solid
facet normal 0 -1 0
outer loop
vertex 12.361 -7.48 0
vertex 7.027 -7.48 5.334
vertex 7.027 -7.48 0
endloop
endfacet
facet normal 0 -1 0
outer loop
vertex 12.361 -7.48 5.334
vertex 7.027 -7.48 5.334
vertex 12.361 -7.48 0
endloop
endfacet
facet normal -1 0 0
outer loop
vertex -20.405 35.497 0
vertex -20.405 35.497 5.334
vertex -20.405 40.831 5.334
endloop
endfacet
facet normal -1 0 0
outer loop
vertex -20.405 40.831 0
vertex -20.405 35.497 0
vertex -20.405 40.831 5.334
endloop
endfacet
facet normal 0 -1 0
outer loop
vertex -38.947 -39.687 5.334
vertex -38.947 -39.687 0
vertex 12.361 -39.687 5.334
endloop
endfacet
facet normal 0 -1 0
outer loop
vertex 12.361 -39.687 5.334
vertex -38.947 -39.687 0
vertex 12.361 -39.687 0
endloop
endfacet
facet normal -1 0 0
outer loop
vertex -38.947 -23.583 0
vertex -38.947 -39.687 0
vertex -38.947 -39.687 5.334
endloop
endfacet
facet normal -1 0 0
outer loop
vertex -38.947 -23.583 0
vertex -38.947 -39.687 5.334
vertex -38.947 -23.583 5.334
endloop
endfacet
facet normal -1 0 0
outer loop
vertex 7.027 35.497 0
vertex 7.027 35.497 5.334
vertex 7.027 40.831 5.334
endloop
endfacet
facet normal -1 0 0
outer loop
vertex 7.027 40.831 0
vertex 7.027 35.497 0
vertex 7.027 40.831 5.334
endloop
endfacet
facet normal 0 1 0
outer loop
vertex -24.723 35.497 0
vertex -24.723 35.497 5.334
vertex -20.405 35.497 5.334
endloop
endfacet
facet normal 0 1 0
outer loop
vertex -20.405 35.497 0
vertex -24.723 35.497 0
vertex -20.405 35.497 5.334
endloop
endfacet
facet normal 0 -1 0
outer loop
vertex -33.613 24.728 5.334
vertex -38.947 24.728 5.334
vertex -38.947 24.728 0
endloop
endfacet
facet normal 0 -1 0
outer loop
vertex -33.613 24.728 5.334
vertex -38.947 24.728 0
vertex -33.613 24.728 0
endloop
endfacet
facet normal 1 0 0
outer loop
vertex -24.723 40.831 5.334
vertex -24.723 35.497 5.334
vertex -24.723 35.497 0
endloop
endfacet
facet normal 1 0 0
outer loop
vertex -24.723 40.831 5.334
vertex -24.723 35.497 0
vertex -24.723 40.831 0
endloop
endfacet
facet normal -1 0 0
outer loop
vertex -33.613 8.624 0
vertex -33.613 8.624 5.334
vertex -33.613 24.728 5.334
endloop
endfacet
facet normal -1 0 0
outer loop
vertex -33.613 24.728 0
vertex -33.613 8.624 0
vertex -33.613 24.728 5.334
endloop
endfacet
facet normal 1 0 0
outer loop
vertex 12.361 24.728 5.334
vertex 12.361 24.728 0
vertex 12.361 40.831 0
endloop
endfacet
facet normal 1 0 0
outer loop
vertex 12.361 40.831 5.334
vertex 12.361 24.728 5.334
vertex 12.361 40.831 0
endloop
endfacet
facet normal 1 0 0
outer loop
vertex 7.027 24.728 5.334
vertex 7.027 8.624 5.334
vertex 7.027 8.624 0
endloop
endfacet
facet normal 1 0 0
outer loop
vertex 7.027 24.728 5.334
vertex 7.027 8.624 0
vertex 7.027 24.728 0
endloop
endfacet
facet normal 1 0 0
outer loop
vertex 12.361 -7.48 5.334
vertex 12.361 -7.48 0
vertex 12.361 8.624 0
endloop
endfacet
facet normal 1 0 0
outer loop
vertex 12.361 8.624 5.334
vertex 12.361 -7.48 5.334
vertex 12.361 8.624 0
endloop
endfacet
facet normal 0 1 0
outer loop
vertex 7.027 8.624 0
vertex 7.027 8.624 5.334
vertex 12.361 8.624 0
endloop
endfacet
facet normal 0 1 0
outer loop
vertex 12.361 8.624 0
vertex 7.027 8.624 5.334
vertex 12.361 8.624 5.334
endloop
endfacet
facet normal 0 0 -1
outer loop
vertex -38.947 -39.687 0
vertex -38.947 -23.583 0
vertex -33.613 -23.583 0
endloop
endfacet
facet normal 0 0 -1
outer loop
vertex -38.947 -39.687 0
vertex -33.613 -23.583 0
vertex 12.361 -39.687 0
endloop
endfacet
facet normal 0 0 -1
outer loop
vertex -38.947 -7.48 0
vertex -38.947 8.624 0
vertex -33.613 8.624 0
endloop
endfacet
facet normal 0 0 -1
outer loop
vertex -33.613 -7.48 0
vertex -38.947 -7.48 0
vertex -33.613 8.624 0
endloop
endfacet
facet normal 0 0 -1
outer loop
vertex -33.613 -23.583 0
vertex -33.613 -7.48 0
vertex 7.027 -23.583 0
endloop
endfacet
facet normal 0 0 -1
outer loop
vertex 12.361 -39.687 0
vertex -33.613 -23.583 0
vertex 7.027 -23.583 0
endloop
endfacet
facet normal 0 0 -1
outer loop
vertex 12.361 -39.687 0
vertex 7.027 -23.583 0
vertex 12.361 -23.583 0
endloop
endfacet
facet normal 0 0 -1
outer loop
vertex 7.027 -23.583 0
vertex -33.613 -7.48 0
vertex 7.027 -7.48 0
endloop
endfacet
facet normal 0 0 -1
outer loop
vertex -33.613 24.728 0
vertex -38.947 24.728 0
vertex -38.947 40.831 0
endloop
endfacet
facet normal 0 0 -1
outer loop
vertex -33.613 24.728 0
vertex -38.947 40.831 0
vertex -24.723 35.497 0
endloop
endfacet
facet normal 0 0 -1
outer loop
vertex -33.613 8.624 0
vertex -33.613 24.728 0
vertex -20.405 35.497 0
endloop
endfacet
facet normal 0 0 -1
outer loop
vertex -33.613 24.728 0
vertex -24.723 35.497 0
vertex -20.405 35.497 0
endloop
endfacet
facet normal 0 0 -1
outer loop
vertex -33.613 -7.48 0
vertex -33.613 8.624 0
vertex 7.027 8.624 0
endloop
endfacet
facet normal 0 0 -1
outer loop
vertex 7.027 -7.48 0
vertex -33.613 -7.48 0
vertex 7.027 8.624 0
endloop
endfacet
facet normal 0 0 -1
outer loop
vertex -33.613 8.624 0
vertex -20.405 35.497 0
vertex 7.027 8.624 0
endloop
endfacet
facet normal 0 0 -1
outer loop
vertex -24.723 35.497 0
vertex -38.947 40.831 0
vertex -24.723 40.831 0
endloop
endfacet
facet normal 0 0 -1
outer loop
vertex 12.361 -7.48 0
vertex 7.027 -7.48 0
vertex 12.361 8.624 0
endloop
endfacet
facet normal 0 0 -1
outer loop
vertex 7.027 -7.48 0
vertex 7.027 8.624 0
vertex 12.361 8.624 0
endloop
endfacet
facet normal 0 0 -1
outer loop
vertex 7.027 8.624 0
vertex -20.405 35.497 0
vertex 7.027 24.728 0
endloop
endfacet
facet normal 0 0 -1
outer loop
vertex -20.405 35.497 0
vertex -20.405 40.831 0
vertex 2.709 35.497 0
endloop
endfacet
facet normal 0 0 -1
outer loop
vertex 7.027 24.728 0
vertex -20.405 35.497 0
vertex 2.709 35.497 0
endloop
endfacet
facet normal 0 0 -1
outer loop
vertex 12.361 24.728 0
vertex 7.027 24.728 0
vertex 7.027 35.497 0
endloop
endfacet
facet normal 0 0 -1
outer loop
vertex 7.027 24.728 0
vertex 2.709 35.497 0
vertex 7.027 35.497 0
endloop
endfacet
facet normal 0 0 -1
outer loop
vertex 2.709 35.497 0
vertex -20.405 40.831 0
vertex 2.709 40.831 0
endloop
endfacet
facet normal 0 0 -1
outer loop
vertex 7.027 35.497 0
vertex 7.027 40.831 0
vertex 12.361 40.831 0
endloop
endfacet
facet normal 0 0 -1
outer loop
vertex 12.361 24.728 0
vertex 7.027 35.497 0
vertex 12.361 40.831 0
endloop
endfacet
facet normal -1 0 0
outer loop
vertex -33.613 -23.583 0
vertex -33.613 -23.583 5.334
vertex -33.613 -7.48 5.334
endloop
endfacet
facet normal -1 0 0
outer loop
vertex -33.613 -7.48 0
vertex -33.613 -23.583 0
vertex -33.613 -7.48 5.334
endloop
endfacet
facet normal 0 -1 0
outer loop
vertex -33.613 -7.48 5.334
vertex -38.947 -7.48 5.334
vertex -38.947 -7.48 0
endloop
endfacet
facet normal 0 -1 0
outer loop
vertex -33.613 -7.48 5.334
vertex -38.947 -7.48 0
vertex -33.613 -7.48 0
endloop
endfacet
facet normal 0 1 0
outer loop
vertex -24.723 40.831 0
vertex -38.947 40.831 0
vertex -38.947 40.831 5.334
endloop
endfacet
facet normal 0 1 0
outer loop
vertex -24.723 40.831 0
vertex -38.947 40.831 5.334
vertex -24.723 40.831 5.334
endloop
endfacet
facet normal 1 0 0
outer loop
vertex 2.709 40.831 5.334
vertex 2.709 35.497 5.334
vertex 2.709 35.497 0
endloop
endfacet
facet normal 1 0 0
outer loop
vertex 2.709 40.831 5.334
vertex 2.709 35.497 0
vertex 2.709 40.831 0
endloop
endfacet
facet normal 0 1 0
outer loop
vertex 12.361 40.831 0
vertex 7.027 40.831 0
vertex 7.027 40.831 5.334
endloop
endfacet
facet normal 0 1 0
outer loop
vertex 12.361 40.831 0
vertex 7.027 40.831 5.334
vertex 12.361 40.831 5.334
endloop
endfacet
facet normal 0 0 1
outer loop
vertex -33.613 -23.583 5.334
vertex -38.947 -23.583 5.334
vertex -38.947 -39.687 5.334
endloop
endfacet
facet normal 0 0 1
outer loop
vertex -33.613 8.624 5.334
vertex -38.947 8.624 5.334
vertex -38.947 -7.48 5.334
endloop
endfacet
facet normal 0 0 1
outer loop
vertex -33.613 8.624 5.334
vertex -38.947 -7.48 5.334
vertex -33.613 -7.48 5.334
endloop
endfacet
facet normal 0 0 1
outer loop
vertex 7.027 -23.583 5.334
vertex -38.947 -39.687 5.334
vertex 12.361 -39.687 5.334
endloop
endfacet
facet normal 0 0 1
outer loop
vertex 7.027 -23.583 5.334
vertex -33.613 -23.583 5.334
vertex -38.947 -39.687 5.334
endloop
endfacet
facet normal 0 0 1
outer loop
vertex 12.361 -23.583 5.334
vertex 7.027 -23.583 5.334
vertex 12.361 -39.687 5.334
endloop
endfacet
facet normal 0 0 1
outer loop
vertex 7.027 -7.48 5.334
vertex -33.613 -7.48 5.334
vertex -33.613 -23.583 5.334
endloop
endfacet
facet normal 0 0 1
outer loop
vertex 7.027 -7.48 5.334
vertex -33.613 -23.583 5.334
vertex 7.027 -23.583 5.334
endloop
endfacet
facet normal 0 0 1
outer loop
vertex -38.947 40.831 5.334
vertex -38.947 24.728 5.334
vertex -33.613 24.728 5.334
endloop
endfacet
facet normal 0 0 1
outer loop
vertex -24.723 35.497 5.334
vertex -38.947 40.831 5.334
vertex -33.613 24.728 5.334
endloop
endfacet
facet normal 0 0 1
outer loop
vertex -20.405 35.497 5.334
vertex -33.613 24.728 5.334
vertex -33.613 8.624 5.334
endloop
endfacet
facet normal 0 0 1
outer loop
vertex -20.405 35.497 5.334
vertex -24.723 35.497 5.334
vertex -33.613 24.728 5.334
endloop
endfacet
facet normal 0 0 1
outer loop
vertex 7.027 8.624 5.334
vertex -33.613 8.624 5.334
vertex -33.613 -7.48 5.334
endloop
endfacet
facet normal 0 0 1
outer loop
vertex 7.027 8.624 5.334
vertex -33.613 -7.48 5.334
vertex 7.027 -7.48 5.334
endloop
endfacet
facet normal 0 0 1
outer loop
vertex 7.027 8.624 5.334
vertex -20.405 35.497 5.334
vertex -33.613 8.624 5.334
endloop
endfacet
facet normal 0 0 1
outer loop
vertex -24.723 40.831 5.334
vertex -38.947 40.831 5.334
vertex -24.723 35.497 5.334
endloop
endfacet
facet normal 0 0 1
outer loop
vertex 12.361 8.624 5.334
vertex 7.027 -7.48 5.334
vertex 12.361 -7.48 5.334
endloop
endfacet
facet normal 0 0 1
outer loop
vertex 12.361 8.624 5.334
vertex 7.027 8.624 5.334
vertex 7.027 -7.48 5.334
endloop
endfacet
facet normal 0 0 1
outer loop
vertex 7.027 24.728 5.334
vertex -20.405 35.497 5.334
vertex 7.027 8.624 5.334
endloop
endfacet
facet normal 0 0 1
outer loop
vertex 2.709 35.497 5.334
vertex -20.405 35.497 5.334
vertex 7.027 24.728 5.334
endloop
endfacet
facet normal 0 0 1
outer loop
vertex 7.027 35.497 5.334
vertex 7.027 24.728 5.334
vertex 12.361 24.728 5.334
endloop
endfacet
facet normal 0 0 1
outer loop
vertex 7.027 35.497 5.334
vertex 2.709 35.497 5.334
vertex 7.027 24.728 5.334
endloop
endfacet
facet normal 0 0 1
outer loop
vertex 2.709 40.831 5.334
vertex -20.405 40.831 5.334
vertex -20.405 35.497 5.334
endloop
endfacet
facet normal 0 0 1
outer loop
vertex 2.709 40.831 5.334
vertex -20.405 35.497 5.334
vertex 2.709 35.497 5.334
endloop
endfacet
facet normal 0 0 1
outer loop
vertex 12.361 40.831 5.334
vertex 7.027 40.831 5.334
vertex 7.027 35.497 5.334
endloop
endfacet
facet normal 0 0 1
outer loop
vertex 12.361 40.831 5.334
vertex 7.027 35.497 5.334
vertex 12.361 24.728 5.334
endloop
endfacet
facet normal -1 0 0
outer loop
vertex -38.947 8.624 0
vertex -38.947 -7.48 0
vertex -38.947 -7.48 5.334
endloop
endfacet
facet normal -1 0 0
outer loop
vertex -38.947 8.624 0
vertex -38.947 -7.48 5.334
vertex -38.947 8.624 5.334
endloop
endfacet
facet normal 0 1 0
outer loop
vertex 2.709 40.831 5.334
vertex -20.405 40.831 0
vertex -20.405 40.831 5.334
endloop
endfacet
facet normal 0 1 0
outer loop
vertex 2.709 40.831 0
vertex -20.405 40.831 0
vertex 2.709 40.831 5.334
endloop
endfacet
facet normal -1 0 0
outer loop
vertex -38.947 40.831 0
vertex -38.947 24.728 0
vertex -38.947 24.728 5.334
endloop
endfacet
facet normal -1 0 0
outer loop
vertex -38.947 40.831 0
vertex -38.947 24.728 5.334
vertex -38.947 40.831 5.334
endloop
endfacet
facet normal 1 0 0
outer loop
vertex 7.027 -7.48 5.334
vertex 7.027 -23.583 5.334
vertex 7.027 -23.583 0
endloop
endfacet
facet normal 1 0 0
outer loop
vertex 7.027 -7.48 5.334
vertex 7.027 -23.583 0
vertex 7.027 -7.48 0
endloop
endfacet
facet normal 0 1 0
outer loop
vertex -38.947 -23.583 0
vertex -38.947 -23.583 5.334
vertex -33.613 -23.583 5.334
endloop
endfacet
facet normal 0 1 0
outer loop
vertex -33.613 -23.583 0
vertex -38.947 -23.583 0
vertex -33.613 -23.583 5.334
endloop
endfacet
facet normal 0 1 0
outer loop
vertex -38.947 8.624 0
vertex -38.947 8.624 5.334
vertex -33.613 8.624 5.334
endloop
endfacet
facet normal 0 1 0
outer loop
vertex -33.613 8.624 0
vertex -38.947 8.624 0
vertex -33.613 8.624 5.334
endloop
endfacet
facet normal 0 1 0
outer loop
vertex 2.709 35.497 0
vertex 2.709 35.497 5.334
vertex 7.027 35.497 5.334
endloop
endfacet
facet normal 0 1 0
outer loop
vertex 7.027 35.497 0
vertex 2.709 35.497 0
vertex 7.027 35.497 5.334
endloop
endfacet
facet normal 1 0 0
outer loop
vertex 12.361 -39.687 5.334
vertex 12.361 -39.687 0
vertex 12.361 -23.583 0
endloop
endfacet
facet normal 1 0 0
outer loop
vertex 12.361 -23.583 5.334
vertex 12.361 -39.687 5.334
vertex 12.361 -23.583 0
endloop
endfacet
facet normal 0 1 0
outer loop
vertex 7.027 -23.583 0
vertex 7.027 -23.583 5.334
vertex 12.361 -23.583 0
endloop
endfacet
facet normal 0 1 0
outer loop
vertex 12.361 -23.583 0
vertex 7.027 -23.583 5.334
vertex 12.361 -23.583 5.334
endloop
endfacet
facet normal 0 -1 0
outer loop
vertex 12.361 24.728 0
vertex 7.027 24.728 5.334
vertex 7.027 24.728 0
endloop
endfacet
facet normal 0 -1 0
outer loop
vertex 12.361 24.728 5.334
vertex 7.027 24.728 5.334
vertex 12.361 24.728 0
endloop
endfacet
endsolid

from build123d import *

# Parameters (mm, degrees)
SKETCH1_W           = 51.308
SKETCH1_H           = 80.518
BOSS_EXTRUDE1_DEPTH = 5.334
SKETCH2_W           = 5.334
SKETCH2_H           = 16.1036
CUT_EXTRUDE1_DEPTH  = 57.679185374
SKETCH3_W           = 4.318
SKETCH3_H           = 5.334
CUT_EXTRUDE2_DEPTH  = 57.679185374


with BuildPart() as part:
    # Sketch1 → Boss-Extrude1 (new body)
    with BuildSketch(Plane.XY):
        with Locations((-13.293278732, 0.572213281)):
            Rectangle(SKETCH1_W, SKETCH1_H)
    extrude(amount=BOSS_EXTRUDE1_DEPTH)

    # Sketch2 → Cut-Extrude1 (cut, through all)
    with BuildSketch(Plane.XY.offset(5.334)):
        with Locations((-36.280278732, 16.675813281)):
            Rectangle(SKETCH2_W, SKETCH2_H)
        with Locations((-36.280278732, -15.531386719)):
            Rectangle(SKETCH2_W, SKETCH2_H)
        with Locations((9.693721268, -15.531386719)):
            Rectangle(SKETCH2_W, SKETCH2_H)
        with Locations((9.693721268, 16.675813281)):
            Rectangle(SKETCH2_W, SKETCH2_H)
    extrude(amount=-CUT_EXTRUDE1_DEPTH, mode=Mode.SUBTRACT)

    # Sketch3 → Cut-Extrude2 (cut, through all)
    with BuildSketch(Plane.XY.offset(5.334)):
        with Locations((-22.564278732, 38.164213281)):
            Rectangle(SKETCH3_W, SKETCH3_H)
        with Locations((4.867721268, 38.164213281)):
            Rectangle(SKETCH3_W, SKETCH3_H)
    extrude(amount=-CUT_EXTRUDE2_DEPTH, mode=Mode.SUBTRACT)


solid = part.part
